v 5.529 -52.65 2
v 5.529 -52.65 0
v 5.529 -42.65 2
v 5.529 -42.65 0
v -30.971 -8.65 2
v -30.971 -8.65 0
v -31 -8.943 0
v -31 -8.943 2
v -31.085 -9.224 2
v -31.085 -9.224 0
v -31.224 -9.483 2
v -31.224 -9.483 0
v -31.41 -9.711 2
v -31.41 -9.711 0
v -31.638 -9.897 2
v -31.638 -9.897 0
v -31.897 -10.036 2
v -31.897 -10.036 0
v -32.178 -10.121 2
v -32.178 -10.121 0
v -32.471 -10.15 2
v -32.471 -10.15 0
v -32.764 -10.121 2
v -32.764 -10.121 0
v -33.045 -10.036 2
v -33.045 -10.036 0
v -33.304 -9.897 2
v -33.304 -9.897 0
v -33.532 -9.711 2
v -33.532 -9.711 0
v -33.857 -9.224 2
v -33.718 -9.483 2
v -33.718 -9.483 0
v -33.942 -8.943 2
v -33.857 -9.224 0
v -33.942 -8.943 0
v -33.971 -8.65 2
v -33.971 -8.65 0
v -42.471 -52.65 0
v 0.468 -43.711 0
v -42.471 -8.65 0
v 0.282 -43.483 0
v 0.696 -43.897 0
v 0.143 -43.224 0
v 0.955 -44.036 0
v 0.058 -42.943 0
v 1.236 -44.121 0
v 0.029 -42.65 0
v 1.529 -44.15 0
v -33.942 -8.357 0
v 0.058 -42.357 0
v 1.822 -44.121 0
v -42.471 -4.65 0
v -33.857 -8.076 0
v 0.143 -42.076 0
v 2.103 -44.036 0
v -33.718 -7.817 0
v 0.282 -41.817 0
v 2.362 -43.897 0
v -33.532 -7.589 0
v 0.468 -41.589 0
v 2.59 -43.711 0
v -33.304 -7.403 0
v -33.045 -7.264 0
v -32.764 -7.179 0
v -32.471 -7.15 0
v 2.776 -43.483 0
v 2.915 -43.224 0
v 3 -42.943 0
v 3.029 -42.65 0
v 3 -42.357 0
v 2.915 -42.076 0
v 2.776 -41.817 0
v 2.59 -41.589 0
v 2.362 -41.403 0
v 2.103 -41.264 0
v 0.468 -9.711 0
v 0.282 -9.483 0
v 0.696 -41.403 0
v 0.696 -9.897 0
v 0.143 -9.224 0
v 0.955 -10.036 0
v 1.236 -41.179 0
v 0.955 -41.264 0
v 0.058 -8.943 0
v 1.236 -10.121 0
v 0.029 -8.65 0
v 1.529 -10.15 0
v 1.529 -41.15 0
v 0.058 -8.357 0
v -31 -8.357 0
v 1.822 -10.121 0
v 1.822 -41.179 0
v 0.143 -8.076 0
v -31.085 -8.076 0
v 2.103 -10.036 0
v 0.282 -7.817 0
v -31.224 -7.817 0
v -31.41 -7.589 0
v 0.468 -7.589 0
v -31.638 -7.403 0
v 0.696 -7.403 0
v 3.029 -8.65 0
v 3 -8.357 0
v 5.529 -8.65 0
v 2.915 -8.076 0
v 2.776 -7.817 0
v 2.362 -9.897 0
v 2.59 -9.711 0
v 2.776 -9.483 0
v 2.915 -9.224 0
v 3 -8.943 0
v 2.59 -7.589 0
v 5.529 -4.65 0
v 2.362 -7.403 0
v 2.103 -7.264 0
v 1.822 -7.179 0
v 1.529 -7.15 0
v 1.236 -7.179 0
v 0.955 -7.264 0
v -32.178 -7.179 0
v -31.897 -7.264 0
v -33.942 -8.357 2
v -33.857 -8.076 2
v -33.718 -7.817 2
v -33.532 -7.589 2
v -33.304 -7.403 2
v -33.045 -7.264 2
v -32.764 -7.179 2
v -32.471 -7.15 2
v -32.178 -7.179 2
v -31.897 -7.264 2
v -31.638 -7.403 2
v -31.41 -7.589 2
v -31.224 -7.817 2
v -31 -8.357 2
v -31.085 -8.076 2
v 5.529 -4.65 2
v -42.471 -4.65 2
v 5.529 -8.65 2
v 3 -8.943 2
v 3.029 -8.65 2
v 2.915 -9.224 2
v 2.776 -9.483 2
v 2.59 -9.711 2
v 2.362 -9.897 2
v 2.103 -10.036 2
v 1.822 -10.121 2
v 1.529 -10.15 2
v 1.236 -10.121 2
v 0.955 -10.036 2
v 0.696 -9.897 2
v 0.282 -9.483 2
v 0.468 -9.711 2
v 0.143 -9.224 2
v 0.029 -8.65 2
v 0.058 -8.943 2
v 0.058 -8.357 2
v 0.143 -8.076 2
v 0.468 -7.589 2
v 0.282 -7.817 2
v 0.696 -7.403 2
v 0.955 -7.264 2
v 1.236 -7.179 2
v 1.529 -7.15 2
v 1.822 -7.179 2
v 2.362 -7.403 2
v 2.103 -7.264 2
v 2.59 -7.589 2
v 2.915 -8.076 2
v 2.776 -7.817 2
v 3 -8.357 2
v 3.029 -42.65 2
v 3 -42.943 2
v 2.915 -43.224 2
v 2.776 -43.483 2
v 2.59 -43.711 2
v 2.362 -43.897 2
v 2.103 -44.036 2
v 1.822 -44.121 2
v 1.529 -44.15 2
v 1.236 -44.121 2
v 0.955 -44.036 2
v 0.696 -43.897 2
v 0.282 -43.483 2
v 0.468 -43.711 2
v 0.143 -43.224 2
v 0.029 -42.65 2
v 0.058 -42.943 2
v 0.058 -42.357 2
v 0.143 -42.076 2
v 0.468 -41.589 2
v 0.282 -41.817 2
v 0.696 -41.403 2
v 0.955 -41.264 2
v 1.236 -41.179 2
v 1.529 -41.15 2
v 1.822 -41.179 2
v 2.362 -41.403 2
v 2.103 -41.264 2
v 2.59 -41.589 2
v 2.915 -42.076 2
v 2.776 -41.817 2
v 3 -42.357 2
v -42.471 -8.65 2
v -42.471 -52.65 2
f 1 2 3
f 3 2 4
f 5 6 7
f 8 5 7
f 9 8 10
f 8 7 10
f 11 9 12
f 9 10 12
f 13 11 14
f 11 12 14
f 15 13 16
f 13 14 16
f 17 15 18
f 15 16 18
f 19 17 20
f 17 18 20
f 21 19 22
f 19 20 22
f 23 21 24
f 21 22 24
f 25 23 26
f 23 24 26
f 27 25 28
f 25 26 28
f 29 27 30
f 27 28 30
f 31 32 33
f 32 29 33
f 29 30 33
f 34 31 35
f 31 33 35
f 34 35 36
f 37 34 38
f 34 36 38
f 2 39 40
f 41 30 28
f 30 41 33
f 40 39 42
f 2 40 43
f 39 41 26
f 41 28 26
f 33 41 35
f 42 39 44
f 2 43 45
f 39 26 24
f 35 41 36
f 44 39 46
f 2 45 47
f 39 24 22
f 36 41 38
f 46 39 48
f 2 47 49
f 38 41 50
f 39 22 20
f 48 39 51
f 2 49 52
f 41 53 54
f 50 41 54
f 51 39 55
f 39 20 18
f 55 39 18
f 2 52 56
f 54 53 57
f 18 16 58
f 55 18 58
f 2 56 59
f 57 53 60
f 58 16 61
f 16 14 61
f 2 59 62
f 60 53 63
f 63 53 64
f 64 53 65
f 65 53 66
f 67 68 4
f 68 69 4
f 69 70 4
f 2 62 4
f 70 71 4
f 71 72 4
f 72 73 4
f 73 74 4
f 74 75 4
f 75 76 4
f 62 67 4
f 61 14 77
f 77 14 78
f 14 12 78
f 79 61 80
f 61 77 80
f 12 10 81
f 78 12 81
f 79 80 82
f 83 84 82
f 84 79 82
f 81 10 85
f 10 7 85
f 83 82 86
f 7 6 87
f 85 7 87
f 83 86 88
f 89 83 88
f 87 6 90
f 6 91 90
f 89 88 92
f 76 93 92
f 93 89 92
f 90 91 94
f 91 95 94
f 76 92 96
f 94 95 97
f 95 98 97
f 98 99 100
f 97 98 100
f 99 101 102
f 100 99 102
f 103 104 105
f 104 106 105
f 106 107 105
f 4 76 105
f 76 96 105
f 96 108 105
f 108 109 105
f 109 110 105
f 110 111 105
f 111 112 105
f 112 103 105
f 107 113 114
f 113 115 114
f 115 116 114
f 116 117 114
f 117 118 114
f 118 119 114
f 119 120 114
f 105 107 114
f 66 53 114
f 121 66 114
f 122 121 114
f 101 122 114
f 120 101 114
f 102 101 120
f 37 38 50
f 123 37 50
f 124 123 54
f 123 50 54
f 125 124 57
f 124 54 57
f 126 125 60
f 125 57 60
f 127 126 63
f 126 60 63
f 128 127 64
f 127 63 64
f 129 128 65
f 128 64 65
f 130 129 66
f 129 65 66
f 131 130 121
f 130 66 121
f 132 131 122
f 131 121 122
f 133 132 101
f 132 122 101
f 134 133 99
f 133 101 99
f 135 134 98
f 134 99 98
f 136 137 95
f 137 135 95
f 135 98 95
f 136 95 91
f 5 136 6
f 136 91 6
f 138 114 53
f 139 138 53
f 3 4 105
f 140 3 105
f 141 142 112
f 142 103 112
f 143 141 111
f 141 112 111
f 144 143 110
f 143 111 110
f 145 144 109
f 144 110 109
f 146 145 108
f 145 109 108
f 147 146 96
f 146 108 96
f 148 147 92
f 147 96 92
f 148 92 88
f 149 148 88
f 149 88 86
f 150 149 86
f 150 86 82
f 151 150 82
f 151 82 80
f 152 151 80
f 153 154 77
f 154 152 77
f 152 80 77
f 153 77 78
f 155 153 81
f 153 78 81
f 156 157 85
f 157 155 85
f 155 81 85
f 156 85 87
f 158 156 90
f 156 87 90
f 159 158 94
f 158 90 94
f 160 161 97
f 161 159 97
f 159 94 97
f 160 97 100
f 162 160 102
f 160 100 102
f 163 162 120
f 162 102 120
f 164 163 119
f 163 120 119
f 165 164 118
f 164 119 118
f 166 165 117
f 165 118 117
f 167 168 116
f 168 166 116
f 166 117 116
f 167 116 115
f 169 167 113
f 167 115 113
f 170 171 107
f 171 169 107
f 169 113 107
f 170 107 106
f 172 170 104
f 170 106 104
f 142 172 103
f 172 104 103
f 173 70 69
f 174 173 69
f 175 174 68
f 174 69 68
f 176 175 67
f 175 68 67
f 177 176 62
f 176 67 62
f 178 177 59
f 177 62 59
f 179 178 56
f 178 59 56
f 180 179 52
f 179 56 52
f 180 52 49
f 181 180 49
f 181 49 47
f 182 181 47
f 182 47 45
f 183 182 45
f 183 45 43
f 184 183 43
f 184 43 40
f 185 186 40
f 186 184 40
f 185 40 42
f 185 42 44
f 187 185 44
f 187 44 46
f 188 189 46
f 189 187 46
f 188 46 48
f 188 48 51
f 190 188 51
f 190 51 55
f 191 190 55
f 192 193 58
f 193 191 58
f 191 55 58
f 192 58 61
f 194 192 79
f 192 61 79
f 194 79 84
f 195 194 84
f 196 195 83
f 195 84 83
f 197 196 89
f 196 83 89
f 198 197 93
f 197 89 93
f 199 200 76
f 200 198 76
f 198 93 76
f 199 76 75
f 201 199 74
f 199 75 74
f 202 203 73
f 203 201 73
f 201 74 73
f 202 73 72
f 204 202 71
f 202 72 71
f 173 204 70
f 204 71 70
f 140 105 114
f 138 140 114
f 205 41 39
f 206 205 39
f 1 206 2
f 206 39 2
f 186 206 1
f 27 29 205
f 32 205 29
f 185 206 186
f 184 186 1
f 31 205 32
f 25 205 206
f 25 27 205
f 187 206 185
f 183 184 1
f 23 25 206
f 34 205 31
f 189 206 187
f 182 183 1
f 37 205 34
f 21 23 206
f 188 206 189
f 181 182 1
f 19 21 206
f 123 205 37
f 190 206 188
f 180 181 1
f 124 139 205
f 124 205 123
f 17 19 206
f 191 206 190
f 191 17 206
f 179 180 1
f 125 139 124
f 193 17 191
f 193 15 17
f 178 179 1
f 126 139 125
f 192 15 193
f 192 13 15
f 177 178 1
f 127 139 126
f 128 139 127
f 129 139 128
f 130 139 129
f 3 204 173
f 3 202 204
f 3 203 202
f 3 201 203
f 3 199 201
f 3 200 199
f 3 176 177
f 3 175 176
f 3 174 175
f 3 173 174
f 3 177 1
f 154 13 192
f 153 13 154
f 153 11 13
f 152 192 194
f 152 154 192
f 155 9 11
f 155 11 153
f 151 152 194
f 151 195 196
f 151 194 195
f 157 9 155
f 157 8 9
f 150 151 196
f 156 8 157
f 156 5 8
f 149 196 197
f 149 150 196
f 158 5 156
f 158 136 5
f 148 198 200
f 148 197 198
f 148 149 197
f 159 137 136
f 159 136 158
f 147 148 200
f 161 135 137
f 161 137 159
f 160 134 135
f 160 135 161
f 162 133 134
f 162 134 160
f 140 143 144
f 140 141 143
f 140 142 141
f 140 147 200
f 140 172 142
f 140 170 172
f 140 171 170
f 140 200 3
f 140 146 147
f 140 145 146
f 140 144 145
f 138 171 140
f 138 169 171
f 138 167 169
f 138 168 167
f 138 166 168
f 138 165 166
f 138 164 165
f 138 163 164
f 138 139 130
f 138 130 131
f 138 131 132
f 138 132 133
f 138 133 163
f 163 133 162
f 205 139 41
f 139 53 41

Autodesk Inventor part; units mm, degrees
ref_plane "YZ Plane" through (0, 0, 0) normal (1, 0, 0) x (0, 1, 0)
ref_plane "XZ Plane" through (0, 0, 0) normal (0, 1, 0) x (-1, 0, 0)
ref_plane "XY Plane" through (0, 0, 0) normal (0, 0, 1) x (1, 0, 0)
sketch "Sketch1" plane through (0, 0, 0) normal (0, 0, 1) x (1, 0, 0)
  line L0 (5.5291, -4.6499) -> (-42.4709, -4.6499)
  line L1 (-42.4709, -4.6499) -> (-42.4709, -52.6499)
  line L2 (-42.4709, -52.6499) -> (5.5291, -52.6499)
  line L3 (5.5291, -52.6499) -> (5.5291, -4.6499)
  line L4 (5.5291, -4.6499) -> (5.5291, -8.6499)
  line L5 (5.5291, -8.6499) -> (1.5291, -8.6499)
  circle A0 centre (1.5291, -8.6499) radius 1.5
  line L6 (-42.4709, -4.6499) -> (-42.4709, -8.6499)
  line L7 (-42.4709, -8.6499) -> (-32.4709, -8.6499)
  circle A1 centre (-32.4709, -8.6499) radius 1.5
  line L8 (5.5291, -52.6499) -> (5.5291, -42.6499)
  line L9 (5.5291, -42.6499) -> (1.5291, -42.6499)
  circle A2 centre (1.5291, -42.6499) radius 1.5
  point P0 (0, 0)
  dimension "d0" = 48
  dimension "d1" = 48
  dimension "d2" = 4
  dimension "d3" = 4
  dimension "d4" = 3
  dimension "d5" = 4
  dimension "d6" = 10
  dimension "d7" = 3
  dimension "d8" = 10
  dimension "d9" = 4
  dimension "d10" = 3
extrude "Extrusion1" add sketch "Sketch1" along normal blind 2
properties part number "contorller kort"
